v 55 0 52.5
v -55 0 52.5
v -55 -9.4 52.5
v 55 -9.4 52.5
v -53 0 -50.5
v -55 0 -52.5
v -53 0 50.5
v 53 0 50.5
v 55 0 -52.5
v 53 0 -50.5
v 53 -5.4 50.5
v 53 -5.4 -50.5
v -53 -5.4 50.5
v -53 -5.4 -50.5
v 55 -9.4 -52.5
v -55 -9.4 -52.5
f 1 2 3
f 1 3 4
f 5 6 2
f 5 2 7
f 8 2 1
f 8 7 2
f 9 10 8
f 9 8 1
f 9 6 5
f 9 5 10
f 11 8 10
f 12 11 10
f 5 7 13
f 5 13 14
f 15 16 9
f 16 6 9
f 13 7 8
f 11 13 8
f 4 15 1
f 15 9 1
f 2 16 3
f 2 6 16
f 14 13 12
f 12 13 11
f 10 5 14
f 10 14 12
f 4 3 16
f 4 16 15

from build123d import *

# Parameters (mm, degrees)
SKETCH1_W           = 110
SKETCH1_H           = 105
SKETCH1_W_2         = 106
SKETCH1_H_2         = 101
BOSS_EXTRUDE1_DEPTH = 5.4
SKETCH2_W           = 110
SKETCH2_H           = 105
BOSS_EXTRUDE2_DEPTH = 4


with BuildPart() as part:
    # Sketch1 → Boss-Extrude1 (new body)
    with BuildSketch(Plane(origin=(0, 0, 0), x_dir=(1, 0, 0), z_dir=(0, 1, 0))):
        Rectangle(SKETCH1_W, SKETCH1_H)
        Rectangle(SKETCH1_W_2, SKETCH1_H_2, mode=Mode.SUBTRACT)
    extrude(amount=-BOSS_EXTRUDE1_DEPTH)

    # Sketch2 → Boss-Extrude2 (add)
    with BuildSketch(Plane.XZ.offset(5.4)):
        Rectangle(SKETCH2_W, SKETCH2_H)
    extrude(amount=BOSS_EXTRUDE2_DEPTH)


solid = part.part
